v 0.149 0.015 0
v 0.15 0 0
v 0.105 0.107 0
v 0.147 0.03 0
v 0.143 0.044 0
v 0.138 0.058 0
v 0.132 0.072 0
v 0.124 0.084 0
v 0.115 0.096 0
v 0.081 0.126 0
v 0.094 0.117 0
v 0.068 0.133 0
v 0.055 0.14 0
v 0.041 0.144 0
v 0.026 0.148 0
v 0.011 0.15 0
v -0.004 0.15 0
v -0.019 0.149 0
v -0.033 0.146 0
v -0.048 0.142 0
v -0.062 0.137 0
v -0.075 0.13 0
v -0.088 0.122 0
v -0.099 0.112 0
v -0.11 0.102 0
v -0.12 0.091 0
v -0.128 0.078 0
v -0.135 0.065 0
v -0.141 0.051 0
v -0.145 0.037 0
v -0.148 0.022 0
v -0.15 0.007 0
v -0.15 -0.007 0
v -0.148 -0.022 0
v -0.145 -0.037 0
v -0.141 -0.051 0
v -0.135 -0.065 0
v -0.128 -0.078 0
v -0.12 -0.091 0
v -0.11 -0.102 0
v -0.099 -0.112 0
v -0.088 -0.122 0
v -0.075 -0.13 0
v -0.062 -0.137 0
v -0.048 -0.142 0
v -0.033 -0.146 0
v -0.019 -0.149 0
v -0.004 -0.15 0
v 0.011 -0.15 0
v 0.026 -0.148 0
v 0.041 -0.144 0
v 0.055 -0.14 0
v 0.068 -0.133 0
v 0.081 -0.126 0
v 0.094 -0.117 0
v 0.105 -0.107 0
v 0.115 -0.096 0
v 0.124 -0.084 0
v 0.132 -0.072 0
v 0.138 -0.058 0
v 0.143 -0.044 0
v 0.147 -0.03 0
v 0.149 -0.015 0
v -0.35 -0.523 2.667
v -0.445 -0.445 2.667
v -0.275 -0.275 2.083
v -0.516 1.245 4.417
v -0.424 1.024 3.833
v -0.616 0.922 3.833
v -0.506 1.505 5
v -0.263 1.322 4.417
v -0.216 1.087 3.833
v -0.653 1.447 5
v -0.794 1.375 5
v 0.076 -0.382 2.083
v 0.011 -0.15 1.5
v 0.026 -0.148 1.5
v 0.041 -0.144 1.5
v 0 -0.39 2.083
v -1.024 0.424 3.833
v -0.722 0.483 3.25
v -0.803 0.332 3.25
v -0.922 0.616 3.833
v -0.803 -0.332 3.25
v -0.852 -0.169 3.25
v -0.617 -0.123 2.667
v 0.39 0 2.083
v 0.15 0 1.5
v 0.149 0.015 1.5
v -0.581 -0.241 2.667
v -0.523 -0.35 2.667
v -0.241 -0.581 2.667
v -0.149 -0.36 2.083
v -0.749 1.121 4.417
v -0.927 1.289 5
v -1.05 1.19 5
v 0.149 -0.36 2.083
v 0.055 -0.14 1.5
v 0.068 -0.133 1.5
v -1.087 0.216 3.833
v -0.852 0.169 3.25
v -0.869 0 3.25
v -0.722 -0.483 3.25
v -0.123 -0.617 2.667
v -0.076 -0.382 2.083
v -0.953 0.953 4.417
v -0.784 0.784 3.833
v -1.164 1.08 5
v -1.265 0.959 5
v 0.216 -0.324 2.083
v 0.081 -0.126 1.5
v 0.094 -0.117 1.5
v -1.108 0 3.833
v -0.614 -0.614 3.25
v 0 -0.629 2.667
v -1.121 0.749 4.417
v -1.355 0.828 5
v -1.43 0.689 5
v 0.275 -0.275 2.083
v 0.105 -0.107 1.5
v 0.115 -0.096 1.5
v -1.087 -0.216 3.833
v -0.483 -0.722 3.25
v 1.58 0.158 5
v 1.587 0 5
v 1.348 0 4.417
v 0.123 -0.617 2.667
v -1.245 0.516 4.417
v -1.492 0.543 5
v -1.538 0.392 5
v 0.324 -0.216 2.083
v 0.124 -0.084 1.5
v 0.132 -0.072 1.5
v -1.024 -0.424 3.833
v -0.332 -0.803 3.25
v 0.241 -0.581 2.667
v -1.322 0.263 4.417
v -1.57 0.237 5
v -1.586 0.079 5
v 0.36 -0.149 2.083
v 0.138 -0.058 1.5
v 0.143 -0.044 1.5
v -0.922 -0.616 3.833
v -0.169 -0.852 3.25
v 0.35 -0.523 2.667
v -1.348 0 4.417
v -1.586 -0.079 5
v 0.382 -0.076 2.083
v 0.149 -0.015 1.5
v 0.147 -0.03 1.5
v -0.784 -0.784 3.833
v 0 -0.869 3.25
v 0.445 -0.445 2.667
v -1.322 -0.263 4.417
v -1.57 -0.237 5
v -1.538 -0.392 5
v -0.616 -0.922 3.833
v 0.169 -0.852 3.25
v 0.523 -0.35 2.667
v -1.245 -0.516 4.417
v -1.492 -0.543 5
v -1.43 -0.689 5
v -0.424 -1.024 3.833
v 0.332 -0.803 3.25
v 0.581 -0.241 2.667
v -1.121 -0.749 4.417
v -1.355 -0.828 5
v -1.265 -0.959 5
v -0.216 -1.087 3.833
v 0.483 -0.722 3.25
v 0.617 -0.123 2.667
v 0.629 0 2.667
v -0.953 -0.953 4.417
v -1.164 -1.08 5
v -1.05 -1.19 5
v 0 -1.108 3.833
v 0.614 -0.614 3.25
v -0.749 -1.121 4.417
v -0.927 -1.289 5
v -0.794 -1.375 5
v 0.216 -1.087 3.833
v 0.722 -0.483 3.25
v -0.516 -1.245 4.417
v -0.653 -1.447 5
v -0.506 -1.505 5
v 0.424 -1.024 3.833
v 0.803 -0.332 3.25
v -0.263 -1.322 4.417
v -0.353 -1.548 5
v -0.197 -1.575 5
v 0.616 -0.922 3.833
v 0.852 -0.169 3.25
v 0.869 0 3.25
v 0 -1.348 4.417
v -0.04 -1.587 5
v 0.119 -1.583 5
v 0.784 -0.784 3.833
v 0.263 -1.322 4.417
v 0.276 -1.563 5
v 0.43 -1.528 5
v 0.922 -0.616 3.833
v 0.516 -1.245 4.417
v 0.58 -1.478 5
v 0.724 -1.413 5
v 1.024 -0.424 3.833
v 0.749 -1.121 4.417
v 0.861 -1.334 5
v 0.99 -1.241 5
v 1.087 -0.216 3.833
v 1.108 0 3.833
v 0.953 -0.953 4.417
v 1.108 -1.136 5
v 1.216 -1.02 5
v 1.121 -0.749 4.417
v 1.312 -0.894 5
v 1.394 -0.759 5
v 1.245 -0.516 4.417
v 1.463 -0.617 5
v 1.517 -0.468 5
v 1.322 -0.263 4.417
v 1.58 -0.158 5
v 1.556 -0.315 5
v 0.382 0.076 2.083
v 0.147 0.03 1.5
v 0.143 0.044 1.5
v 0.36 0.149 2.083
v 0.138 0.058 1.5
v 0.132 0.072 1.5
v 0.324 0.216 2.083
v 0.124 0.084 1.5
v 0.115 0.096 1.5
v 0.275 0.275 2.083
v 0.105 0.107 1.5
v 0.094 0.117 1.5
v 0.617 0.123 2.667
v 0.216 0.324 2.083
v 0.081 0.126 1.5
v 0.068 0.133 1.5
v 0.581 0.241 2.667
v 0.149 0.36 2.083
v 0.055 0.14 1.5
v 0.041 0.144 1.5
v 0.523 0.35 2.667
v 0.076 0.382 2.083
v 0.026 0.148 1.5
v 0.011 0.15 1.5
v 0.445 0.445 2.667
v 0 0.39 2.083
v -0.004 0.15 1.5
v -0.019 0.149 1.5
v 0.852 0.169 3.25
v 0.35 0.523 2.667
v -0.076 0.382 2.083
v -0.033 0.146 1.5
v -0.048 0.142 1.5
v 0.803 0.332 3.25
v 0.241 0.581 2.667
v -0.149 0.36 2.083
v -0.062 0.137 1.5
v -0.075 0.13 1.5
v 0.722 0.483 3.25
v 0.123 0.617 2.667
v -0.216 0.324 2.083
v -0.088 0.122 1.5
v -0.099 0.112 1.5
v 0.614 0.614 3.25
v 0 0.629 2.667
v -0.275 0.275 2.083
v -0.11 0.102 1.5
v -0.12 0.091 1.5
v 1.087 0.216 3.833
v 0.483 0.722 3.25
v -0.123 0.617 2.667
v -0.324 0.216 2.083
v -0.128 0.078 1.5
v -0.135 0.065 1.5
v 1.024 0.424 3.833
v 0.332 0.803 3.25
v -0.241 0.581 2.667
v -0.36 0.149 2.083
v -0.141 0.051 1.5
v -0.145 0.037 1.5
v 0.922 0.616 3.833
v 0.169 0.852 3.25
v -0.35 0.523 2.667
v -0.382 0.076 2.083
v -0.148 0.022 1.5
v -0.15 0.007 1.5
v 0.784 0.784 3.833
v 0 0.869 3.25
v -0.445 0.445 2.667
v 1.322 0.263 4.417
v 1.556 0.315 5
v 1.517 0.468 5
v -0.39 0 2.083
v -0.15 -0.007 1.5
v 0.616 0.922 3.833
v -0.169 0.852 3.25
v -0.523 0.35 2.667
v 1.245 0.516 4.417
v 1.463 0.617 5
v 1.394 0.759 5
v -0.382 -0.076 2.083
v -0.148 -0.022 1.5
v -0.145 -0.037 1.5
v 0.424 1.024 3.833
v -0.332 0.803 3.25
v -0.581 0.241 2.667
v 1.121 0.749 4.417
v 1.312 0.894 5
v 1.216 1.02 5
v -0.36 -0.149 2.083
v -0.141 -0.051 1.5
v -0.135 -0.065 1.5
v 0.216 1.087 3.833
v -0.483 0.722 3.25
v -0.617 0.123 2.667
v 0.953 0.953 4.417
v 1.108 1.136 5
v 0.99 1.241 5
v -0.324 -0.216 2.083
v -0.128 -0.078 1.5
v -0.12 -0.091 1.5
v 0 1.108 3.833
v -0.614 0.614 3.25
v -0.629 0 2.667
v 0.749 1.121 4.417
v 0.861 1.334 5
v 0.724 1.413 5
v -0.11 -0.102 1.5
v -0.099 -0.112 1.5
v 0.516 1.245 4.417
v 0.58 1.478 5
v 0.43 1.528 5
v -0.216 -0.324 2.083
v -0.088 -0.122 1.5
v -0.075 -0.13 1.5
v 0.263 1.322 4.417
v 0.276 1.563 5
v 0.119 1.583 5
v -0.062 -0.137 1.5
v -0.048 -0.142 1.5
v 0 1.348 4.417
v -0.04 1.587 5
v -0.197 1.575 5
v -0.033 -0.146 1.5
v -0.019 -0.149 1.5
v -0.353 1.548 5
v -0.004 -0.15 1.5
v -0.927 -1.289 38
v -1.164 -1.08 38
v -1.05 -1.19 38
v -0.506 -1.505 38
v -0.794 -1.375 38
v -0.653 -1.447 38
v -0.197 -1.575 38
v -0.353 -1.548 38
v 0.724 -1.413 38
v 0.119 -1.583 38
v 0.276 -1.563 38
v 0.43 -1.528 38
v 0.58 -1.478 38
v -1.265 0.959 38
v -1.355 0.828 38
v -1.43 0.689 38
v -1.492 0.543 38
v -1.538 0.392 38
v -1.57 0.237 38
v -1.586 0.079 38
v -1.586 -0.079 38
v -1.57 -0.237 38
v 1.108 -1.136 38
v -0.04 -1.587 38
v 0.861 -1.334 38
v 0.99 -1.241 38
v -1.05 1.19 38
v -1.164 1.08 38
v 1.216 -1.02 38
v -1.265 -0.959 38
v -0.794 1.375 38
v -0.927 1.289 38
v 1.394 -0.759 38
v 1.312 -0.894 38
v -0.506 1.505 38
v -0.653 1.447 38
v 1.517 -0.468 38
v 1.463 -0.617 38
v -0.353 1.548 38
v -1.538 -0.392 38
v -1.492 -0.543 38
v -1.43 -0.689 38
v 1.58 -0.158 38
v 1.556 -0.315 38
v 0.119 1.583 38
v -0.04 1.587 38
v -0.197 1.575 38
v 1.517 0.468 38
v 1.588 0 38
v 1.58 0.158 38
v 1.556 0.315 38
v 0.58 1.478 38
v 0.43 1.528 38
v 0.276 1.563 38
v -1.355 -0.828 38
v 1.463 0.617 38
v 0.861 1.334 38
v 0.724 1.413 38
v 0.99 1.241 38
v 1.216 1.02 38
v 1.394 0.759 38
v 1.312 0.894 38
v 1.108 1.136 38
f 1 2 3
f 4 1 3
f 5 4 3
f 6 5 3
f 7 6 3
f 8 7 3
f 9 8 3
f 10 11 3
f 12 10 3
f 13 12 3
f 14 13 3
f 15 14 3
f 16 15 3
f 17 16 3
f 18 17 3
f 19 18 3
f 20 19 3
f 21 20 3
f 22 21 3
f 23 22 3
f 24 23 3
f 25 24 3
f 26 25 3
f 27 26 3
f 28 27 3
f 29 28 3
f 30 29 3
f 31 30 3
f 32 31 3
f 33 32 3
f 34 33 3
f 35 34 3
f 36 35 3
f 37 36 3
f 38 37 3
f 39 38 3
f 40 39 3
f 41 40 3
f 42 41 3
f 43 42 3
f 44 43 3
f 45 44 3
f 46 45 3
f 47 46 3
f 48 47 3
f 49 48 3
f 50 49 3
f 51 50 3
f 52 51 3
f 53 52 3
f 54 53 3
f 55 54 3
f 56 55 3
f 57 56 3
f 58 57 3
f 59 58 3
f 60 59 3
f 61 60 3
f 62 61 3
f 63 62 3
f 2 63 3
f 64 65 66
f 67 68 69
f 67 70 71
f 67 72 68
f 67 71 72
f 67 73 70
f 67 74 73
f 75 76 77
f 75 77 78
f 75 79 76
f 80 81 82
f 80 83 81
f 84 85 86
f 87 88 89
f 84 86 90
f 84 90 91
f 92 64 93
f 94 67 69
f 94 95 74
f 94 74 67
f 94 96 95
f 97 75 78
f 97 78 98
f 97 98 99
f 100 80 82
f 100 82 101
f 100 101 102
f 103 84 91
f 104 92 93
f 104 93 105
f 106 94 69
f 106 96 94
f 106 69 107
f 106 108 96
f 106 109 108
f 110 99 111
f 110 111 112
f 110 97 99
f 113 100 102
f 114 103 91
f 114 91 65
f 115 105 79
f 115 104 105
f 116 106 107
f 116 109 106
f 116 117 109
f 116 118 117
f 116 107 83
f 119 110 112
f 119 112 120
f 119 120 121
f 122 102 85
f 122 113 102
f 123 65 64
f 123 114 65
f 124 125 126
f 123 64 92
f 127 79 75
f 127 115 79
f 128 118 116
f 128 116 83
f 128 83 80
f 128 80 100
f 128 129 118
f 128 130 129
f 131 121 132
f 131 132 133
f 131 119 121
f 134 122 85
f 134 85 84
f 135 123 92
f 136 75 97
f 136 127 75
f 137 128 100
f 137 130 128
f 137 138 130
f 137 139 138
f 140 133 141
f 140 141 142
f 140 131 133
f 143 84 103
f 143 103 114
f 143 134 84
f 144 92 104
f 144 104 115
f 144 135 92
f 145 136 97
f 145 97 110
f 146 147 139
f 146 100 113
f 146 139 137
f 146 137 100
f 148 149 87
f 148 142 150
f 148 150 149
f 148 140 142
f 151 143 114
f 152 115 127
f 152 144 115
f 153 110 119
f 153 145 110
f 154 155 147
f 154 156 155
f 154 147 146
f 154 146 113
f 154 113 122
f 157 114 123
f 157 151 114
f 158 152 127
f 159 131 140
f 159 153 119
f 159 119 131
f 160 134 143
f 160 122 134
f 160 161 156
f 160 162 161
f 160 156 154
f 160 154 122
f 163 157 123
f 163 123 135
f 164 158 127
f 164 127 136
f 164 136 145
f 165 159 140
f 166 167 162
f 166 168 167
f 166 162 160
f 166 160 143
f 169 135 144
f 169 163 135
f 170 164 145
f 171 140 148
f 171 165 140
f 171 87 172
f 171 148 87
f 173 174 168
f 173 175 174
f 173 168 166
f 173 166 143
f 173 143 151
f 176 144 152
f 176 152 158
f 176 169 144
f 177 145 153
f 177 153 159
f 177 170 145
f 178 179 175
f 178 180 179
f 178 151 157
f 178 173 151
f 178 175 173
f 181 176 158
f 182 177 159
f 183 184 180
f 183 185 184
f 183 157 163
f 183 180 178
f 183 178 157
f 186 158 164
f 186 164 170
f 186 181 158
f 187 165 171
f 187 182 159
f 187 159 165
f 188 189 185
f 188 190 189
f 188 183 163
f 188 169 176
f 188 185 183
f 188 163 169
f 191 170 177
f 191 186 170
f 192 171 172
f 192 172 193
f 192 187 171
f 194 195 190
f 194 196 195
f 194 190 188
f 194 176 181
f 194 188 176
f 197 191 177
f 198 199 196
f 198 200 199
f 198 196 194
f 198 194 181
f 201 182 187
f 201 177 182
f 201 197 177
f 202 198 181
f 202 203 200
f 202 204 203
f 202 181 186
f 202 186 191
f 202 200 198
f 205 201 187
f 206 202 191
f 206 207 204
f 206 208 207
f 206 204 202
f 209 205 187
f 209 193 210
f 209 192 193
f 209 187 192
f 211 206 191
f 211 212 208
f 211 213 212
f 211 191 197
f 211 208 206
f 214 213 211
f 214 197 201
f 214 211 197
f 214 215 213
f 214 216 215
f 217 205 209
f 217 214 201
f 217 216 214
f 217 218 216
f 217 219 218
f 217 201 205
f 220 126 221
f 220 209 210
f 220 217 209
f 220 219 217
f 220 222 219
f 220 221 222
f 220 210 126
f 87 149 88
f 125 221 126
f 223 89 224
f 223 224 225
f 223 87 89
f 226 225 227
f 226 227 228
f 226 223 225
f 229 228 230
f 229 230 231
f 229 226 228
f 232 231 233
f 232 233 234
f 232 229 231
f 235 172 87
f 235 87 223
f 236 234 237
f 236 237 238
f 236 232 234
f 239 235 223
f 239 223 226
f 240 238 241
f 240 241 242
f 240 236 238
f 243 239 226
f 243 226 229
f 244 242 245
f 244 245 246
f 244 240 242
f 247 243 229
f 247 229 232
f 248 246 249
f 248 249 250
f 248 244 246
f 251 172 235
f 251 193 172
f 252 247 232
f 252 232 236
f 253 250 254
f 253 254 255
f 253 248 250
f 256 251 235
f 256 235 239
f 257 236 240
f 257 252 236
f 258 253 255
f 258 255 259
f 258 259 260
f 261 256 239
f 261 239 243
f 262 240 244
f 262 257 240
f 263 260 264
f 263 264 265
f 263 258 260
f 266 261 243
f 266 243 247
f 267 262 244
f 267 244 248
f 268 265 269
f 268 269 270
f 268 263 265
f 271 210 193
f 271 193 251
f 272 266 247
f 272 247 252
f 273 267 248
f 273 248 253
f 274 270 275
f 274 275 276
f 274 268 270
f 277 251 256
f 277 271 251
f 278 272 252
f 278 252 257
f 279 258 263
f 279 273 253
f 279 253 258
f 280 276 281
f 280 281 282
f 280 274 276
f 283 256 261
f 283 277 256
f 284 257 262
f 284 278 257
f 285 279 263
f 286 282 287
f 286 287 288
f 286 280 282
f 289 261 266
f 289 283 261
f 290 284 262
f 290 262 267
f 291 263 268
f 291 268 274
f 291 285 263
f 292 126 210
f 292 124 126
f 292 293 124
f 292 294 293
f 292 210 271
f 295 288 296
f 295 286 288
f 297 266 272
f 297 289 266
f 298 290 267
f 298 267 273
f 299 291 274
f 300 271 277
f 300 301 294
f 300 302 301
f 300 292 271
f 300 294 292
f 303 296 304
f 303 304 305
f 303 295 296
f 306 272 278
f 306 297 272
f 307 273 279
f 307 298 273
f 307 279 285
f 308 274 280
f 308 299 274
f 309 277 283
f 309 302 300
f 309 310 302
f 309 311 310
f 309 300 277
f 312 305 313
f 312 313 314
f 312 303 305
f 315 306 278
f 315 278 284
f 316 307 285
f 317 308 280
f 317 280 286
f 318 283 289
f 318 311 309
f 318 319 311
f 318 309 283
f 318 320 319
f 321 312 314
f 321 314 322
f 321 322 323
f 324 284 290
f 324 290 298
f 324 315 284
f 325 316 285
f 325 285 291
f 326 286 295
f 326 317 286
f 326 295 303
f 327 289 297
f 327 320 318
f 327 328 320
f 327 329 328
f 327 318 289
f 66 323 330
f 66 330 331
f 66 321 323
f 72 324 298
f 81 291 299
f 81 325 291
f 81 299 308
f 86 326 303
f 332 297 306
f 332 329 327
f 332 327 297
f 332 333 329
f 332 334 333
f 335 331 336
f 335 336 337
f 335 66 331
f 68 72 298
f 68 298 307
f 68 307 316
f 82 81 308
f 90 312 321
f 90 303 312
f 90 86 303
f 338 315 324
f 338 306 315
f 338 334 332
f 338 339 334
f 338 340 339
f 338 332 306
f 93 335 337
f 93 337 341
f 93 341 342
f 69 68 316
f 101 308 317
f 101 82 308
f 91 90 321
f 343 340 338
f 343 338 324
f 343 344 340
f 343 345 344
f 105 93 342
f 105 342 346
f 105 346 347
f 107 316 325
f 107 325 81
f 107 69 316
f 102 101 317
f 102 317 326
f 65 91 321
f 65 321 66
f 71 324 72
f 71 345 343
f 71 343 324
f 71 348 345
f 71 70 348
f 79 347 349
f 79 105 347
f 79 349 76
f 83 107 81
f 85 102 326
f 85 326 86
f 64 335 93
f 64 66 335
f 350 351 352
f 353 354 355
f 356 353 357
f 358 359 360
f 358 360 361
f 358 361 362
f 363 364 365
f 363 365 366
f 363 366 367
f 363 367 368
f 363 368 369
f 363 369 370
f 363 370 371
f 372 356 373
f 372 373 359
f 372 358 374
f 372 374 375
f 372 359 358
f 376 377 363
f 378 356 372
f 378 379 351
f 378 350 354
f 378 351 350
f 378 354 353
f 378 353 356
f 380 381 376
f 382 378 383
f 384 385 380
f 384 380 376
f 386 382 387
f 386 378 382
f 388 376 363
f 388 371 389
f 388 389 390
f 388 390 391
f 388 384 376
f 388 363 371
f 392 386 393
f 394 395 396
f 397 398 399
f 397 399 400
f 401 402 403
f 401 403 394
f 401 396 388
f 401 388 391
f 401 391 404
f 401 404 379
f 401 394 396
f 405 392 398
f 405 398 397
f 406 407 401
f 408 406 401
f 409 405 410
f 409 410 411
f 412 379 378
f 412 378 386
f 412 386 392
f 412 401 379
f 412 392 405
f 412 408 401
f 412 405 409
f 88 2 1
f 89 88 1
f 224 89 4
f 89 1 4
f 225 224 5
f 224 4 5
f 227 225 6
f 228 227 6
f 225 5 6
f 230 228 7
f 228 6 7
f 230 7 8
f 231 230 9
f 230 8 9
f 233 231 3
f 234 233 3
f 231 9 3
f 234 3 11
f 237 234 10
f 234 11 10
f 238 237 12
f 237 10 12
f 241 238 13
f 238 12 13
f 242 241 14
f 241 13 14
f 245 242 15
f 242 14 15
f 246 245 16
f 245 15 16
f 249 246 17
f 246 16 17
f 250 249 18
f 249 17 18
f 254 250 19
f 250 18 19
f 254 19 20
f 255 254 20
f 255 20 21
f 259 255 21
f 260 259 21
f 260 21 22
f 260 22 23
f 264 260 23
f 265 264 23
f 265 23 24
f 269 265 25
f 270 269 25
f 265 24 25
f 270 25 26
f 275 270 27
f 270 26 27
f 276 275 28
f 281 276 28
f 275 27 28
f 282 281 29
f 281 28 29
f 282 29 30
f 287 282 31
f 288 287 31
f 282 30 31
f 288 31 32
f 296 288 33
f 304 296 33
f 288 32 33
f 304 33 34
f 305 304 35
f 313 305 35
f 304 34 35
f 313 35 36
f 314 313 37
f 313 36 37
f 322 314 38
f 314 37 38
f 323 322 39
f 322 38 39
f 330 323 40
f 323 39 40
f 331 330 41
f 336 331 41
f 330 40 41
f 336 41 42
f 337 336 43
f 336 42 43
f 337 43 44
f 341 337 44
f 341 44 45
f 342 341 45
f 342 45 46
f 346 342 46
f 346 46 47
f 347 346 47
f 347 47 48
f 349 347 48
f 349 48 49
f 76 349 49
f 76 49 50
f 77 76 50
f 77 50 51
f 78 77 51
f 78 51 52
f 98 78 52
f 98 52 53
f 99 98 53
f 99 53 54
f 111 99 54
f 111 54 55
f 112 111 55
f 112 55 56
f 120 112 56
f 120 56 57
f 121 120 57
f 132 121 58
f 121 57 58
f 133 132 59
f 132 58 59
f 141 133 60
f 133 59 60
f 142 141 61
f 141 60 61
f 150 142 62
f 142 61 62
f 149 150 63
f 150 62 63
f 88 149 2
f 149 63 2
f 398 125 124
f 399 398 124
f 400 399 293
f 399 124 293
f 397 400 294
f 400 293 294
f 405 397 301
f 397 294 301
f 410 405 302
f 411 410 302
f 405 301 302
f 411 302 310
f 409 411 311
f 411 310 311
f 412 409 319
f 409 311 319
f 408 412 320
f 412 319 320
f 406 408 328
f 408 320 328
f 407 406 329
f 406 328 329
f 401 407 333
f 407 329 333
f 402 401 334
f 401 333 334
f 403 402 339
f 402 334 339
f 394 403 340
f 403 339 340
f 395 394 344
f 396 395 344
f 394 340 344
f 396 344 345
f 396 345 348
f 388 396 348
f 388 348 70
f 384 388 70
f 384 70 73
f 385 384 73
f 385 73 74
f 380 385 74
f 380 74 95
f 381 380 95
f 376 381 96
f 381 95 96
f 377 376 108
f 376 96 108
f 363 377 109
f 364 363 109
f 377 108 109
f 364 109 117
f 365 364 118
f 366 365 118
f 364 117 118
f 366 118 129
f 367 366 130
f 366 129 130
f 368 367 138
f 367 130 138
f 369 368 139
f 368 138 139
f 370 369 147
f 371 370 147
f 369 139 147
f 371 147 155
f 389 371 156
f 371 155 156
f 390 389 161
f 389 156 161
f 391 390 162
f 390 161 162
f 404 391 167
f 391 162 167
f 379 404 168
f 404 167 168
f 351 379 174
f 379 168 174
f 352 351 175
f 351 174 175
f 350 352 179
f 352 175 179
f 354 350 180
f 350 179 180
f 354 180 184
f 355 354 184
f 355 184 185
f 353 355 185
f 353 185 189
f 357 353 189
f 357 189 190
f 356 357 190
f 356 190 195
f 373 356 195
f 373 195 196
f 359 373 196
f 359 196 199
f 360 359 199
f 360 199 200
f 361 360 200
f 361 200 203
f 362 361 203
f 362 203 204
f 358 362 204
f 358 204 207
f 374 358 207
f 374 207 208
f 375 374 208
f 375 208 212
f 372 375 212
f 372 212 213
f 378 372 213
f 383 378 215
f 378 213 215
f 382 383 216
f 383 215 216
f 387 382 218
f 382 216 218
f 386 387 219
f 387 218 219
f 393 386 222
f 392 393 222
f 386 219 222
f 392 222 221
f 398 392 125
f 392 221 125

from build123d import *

# Parameters (mm, degrees)
SKETCH_R     = 0.15
PAD_DEPTH    = 1.5
SKETCH001_R  = 0.15
SKETCH002_R  = 1.5875
SKETCH003_R  = 1.5875
PAD001_DEPTH = 33


with BuildPart() as pad:
    # Sketch → Pad (new body)
    with BuildSketch(Plane.XY):
        Circle(SKETCH_R)
    extrude(amount=PAD_DEPTH)


with BuildPart() as pad001:
    # Sketch001 → Loft section 0
    with BuildSketch(Plane.XY.offset(1.5)):
        Circle(SKETCH001_R)
    # Sketch002 → Loft section 1
    with BuildSketch(Plane.XY.offset(5)):
        Circle(SKETCH002_R)
    loft()

    # Fusion: union Pad
    add(pad.part)

    # Sketch003 → Pad001 (new body)
    with BuildSketch(Plane.XY.offset(5)):
        Circle(SKETCH003_R)
    extrude(amount=PAD001_DEPTH)


solid = pad001.part
